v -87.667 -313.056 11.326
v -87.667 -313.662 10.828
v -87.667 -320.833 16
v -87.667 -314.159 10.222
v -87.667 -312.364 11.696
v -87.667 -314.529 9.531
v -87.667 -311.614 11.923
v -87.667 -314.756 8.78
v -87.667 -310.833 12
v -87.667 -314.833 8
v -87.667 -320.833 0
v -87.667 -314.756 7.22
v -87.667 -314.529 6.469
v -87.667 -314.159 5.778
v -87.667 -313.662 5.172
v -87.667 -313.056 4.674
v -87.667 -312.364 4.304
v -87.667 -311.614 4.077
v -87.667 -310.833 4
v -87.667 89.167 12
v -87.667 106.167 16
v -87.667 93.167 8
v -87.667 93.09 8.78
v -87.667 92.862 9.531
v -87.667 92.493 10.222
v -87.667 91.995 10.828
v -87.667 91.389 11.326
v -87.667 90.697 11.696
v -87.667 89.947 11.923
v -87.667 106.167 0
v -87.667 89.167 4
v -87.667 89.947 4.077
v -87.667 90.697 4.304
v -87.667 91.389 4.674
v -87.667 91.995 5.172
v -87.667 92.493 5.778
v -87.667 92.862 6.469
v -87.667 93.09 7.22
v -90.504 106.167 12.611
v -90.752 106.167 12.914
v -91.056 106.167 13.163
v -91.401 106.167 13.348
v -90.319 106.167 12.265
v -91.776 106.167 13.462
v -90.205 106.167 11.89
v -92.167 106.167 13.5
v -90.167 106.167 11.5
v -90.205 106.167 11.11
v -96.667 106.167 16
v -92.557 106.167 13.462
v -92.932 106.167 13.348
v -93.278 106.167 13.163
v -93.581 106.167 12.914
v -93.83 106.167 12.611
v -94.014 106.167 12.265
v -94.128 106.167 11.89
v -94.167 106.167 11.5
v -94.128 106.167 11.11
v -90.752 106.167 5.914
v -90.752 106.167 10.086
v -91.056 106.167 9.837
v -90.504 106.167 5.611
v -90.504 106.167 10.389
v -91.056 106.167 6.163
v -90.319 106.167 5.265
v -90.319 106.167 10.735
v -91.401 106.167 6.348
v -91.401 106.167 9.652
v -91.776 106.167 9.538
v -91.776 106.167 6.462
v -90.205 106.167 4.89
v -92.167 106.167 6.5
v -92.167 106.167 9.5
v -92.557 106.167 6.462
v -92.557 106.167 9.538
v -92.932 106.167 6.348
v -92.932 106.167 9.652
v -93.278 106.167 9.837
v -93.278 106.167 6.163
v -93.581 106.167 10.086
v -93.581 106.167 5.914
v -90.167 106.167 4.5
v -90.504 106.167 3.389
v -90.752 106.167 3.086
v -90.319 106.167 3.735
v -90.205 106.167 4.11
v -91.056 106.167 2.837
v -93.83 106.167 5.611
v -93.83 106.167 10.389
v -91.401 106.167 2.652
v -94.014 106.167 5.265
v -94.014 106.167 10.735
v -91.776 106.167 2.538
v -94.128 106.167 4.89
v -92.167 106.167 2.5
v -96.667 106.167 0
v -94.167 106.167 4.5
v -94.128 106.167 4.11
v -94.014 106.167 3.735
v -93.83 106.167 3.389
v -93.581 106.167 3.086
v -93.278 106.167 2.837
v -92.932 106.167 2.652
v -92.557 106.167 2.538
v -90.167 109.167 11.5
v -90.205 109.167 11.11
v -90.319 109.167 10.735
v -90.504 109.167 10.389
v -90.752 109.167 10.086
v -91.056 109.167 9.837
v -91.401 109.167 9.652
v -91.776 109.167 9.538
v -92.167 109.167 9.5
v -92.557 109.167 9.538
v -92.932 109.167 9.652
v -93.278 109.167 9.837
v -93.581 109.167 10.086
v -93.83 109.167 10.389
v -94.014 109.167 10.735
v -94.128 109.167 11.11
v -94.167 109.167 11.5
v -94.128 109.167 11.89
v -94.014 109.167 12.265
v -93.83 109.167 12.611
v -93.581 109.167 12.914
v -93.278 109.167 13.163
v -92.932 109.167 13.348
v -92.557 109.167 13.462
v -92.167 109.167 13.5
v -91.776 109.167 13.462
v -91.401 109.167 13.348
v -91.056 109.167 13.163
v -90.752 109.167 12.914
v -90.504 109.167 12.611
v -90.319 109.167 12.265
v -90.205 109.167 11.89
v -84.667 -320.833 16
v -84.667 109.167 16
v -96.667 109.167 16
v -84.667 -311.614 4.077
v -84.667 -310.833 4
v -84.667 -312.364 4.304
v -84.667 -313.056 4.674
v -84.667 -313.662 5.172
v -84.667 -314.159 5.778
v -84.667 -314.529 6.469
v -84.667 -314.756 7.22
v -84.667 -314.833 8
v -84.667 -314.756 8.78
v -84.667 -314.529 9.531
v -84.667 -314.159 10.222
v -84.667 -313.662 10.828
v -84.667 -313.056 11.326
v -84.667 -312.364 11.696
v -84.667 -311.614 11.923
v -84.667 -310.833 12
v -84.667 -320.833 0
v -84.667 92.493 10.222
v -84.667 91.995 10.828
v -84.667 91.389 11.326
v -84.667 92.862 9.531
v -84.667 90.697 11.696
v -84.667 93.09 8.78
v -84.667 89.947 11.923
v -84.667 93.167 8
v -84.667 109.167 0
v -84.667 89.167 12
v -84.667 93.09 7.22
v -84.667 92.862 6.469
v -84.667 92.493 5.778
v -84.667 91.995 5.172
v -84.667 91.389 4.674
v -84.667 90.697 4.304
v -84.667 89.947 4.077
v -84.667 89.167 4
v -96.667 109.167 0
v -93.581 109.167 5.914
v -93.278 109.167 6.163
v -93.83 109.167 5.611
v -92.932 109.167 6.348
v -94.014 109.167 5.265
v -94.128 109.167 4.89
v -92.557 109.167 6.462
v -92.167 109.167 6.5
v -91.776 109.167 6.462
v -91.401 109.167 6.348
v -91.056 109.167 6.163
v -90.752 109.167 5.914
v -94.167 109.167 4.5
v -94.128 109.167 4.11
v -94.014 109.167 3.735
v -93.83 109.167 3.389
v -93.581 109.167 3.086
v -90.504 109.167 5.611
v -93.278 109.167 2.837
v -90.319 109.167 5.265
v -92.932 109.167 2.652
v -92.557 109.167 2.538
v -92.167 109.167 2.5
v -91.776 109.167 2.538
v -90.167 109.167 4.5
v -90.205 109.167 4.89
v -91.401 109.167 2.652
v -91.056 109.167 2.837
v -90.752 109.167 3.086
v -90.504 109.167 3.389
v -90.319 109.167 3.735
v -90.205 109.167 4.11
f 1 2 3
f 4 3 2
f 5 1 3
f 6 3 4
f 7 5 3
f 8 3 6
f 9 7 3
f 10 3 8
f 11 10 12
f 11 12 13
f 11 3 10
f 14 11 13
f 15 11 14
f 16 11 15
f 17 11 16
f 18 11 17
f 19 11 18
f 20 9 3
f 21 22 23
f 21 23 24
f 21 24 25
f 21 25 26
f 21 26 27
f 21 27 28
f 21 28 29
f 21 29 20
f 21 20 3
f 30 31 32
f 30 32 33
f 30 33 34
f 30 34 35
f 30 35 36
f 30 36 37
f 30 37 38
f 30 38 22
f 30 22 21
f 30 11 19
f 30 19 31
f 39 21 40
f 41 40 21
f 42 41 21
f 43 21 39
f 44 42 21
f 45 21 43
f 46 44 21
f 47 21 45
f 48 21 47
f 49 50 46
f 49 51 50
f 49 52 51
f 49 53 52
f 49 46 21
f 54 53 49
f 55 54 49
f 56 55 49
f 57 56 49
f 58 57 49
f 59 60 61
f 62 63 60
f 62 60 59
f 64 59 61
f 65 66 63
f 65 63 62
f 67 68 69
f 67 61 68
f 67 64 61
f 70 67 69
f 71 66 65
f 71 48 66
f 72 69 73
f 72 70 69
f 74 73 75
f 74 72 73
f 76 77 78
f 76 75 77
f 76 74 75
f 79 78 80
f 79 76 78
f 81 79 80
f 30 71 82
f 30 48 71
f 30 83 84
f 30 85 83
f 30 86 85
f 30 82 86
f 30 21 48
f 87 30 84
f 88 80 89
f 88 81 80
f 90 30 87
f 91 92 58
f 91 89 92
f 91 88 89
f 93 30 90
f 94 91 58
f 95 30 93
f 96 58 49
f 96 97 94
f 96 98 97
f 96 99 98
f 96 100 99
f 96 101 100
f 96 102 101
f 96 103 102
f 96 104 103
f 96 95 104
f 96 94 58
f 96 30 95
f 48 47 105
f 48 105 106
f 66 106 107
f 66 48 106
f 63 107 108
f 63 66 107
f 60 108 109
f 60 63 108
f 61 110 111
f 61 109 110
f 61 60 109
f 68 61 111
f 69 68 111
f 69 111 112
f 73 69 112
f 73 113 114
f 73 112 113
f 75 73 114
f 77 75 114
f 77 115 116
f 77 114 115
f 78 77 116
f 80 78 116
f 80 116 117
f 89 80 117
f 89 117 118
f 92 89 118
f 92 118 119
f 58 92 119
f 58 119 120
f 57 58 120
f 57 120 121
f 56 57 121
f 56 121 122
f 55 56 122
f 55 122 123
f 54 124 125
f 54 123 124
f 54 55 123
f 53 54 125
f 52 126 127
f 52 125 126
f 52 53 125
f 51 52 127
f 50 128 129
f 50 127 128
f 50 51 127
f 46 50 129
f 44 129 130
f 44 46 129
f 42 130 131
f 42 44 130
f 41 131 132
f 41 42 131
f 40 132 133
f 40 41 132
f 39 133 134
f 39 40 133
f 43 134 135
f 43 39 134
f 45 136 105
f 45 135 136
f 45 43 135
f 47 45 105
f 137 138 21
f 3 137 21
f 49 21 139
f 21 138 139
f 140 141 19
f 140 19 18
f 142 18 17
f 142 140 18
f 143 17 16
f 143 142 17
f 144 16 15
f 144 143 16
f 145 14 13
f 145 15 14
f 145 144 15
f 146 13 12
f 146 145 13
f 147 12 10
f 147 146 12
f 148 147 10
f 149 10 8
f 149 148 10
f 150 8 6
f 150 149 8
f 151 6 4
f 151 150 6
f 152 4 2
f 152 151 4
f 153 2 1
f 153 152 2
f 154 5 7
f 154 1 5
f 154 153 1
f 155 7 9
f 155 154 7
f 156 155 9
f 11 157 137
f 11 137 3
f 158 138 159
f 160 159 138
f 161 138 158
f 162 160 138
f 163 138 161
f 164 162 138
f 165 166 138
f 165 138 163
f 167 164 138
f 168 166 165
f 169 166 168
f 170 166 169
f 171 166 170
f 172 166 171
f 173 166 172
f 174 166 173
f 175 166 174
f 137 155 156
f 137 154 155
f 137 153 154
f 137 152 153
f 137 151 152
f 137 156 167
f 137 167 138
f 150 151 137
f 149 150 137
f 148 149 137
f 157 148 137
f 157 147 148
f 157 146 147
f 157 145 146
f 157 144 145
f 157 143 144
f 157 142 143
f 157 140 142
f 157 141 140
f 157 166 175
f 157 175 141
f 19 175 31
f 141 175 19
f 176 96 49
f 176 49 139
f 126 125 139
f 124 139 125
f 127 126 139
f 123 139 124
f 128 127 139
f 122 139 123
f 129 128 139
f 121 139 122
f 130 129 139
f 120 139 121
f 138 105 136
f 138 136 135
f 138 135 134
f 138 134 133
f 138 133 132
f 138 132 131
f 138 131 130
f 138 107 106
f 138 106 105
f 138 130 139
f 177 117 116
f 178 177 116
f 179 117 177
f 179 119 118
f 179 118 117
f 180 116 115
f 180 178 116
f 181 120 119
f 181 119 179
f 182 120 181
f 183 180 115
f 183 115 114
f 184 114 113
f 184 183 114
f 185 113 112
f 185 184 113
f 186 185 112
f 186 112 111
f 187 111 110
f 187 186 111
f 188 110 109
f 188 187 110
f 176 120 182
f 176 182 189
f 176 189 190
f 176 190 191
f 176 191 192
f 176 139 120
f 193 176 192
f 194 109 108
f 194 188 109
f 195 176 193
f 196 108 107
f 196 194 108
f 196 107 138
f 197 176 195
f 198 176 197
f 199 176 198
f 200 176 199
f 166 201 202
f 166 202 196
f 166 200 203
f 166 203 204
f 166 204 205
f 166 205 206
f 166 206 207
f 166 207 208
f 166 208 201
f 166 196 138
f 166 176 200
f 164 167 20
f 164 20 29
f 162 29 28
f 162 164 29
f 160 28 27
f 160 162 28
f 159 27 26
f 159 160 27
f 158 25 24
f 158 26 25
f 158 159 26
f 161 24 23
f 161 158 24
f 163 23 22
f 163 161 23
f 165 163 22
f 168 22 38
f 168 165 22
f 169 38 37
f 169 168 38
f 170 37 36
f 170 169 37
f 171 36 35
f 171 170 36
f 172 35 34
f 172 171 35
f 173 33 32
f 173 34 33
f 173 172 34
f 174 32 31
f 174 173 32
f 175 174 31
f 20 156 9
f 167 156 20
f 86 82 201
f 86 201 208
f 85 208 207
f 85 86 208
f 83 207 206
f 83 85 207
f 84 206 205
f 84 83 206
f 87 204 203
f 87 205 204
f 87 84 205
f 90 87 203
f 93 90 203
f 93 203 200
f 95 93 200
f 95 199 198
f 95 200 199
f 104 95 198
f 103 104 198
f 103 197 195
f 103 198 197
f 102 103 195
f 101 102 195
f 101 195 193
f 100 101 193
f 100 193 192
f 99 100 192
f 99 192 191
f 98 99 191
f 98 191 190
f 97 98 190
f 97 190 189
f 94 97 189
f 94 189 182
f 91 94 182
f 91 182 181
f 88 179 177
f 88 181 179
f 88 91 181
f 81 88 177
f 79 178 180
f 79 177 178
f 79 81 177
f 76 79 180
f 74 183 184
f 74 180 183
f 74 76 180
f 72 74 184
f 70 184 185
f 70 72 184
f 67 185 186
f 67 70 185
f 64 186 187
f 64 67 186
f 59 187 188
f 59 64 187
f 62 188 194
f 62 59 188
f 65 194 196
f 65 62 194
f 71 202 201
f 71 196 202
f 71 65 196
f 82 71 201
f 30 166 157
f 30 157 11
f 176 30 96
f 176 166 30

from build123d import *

# Parameters (mm, degrees)
BOSS_EXTRUDE1_DEPTH     = 16
SKETCH2_R               = 2
CUT_EXTRUDE1_DEPTH      = 110.166666667
CUT_EXTRUDE1_DEPTH_BACK = 321.833333333
CUT_EXTRUDE2_DEPTH      = 97.666666667


with BuildPart() as part:
    # Sketch1 → Boss-Extrude1 (new body)
    with BuildSketch(Plane.XY):
        Polygon((-96.666666667, 109.166666667), (-84.666666667, 109.166666667), (-84.666666667, -320.833333333), (-87.666666667, -320.833333333), (-87.666666667, 106.166666667), (-96.666666667, 106.166666667), align=None)
    extrude(amount=BOSS_EXTRUDE1_DEPTH)

    # Sketch2 → Cut-Extrude1 (cut, two sides)
    with BuildSketch(Plane(origin=(0, 0, 0), x_dir=(1, 0, 0), z_dir=(0, 1, 0))) as cut_extrude1_sk:
        with Locations((-92.166666667, -11.5)):
            Circle(SKETCH2_R)
        with Locations((-92.166666667, -4.5)):
            Circle(SKETCH2_R)
    extrude(amount=CUT_EXTRUDE1_DEPTH, mode=Mode.SUBTRACT)
    extrude(cut_extrude1_sk.sketch, amount=-CUT_EXTRUDE1_DEPTH_BACK, mode=Mode.SUBTRACT)

    # Sketch3 → Cut-Extrude2 (cut, through all)
    with BuildSketch(Plane(origin=(0, 0, 0), x_dir=(0, 0, -1), z_dir=(1, 0, 0))):
        with BuildLine():
            Line((-4, 89.166666667), (-4, -310.833333333))
            ThreePointArc((-4, -310.833333333), (-8, -314.833333333), (-12, -310.833333333))
            Line((-12, -310.833333333), (-12, 89.166666667))
            ThreePointArc((-12, 89.166666667), (-8, 93.166666667), (-4, 89.166666667))
        make_face()
    extrude(amount=-CUT_EXTRUDE2_DEPTH, mode=Mode.SUBTRACT)


solid = part.part
